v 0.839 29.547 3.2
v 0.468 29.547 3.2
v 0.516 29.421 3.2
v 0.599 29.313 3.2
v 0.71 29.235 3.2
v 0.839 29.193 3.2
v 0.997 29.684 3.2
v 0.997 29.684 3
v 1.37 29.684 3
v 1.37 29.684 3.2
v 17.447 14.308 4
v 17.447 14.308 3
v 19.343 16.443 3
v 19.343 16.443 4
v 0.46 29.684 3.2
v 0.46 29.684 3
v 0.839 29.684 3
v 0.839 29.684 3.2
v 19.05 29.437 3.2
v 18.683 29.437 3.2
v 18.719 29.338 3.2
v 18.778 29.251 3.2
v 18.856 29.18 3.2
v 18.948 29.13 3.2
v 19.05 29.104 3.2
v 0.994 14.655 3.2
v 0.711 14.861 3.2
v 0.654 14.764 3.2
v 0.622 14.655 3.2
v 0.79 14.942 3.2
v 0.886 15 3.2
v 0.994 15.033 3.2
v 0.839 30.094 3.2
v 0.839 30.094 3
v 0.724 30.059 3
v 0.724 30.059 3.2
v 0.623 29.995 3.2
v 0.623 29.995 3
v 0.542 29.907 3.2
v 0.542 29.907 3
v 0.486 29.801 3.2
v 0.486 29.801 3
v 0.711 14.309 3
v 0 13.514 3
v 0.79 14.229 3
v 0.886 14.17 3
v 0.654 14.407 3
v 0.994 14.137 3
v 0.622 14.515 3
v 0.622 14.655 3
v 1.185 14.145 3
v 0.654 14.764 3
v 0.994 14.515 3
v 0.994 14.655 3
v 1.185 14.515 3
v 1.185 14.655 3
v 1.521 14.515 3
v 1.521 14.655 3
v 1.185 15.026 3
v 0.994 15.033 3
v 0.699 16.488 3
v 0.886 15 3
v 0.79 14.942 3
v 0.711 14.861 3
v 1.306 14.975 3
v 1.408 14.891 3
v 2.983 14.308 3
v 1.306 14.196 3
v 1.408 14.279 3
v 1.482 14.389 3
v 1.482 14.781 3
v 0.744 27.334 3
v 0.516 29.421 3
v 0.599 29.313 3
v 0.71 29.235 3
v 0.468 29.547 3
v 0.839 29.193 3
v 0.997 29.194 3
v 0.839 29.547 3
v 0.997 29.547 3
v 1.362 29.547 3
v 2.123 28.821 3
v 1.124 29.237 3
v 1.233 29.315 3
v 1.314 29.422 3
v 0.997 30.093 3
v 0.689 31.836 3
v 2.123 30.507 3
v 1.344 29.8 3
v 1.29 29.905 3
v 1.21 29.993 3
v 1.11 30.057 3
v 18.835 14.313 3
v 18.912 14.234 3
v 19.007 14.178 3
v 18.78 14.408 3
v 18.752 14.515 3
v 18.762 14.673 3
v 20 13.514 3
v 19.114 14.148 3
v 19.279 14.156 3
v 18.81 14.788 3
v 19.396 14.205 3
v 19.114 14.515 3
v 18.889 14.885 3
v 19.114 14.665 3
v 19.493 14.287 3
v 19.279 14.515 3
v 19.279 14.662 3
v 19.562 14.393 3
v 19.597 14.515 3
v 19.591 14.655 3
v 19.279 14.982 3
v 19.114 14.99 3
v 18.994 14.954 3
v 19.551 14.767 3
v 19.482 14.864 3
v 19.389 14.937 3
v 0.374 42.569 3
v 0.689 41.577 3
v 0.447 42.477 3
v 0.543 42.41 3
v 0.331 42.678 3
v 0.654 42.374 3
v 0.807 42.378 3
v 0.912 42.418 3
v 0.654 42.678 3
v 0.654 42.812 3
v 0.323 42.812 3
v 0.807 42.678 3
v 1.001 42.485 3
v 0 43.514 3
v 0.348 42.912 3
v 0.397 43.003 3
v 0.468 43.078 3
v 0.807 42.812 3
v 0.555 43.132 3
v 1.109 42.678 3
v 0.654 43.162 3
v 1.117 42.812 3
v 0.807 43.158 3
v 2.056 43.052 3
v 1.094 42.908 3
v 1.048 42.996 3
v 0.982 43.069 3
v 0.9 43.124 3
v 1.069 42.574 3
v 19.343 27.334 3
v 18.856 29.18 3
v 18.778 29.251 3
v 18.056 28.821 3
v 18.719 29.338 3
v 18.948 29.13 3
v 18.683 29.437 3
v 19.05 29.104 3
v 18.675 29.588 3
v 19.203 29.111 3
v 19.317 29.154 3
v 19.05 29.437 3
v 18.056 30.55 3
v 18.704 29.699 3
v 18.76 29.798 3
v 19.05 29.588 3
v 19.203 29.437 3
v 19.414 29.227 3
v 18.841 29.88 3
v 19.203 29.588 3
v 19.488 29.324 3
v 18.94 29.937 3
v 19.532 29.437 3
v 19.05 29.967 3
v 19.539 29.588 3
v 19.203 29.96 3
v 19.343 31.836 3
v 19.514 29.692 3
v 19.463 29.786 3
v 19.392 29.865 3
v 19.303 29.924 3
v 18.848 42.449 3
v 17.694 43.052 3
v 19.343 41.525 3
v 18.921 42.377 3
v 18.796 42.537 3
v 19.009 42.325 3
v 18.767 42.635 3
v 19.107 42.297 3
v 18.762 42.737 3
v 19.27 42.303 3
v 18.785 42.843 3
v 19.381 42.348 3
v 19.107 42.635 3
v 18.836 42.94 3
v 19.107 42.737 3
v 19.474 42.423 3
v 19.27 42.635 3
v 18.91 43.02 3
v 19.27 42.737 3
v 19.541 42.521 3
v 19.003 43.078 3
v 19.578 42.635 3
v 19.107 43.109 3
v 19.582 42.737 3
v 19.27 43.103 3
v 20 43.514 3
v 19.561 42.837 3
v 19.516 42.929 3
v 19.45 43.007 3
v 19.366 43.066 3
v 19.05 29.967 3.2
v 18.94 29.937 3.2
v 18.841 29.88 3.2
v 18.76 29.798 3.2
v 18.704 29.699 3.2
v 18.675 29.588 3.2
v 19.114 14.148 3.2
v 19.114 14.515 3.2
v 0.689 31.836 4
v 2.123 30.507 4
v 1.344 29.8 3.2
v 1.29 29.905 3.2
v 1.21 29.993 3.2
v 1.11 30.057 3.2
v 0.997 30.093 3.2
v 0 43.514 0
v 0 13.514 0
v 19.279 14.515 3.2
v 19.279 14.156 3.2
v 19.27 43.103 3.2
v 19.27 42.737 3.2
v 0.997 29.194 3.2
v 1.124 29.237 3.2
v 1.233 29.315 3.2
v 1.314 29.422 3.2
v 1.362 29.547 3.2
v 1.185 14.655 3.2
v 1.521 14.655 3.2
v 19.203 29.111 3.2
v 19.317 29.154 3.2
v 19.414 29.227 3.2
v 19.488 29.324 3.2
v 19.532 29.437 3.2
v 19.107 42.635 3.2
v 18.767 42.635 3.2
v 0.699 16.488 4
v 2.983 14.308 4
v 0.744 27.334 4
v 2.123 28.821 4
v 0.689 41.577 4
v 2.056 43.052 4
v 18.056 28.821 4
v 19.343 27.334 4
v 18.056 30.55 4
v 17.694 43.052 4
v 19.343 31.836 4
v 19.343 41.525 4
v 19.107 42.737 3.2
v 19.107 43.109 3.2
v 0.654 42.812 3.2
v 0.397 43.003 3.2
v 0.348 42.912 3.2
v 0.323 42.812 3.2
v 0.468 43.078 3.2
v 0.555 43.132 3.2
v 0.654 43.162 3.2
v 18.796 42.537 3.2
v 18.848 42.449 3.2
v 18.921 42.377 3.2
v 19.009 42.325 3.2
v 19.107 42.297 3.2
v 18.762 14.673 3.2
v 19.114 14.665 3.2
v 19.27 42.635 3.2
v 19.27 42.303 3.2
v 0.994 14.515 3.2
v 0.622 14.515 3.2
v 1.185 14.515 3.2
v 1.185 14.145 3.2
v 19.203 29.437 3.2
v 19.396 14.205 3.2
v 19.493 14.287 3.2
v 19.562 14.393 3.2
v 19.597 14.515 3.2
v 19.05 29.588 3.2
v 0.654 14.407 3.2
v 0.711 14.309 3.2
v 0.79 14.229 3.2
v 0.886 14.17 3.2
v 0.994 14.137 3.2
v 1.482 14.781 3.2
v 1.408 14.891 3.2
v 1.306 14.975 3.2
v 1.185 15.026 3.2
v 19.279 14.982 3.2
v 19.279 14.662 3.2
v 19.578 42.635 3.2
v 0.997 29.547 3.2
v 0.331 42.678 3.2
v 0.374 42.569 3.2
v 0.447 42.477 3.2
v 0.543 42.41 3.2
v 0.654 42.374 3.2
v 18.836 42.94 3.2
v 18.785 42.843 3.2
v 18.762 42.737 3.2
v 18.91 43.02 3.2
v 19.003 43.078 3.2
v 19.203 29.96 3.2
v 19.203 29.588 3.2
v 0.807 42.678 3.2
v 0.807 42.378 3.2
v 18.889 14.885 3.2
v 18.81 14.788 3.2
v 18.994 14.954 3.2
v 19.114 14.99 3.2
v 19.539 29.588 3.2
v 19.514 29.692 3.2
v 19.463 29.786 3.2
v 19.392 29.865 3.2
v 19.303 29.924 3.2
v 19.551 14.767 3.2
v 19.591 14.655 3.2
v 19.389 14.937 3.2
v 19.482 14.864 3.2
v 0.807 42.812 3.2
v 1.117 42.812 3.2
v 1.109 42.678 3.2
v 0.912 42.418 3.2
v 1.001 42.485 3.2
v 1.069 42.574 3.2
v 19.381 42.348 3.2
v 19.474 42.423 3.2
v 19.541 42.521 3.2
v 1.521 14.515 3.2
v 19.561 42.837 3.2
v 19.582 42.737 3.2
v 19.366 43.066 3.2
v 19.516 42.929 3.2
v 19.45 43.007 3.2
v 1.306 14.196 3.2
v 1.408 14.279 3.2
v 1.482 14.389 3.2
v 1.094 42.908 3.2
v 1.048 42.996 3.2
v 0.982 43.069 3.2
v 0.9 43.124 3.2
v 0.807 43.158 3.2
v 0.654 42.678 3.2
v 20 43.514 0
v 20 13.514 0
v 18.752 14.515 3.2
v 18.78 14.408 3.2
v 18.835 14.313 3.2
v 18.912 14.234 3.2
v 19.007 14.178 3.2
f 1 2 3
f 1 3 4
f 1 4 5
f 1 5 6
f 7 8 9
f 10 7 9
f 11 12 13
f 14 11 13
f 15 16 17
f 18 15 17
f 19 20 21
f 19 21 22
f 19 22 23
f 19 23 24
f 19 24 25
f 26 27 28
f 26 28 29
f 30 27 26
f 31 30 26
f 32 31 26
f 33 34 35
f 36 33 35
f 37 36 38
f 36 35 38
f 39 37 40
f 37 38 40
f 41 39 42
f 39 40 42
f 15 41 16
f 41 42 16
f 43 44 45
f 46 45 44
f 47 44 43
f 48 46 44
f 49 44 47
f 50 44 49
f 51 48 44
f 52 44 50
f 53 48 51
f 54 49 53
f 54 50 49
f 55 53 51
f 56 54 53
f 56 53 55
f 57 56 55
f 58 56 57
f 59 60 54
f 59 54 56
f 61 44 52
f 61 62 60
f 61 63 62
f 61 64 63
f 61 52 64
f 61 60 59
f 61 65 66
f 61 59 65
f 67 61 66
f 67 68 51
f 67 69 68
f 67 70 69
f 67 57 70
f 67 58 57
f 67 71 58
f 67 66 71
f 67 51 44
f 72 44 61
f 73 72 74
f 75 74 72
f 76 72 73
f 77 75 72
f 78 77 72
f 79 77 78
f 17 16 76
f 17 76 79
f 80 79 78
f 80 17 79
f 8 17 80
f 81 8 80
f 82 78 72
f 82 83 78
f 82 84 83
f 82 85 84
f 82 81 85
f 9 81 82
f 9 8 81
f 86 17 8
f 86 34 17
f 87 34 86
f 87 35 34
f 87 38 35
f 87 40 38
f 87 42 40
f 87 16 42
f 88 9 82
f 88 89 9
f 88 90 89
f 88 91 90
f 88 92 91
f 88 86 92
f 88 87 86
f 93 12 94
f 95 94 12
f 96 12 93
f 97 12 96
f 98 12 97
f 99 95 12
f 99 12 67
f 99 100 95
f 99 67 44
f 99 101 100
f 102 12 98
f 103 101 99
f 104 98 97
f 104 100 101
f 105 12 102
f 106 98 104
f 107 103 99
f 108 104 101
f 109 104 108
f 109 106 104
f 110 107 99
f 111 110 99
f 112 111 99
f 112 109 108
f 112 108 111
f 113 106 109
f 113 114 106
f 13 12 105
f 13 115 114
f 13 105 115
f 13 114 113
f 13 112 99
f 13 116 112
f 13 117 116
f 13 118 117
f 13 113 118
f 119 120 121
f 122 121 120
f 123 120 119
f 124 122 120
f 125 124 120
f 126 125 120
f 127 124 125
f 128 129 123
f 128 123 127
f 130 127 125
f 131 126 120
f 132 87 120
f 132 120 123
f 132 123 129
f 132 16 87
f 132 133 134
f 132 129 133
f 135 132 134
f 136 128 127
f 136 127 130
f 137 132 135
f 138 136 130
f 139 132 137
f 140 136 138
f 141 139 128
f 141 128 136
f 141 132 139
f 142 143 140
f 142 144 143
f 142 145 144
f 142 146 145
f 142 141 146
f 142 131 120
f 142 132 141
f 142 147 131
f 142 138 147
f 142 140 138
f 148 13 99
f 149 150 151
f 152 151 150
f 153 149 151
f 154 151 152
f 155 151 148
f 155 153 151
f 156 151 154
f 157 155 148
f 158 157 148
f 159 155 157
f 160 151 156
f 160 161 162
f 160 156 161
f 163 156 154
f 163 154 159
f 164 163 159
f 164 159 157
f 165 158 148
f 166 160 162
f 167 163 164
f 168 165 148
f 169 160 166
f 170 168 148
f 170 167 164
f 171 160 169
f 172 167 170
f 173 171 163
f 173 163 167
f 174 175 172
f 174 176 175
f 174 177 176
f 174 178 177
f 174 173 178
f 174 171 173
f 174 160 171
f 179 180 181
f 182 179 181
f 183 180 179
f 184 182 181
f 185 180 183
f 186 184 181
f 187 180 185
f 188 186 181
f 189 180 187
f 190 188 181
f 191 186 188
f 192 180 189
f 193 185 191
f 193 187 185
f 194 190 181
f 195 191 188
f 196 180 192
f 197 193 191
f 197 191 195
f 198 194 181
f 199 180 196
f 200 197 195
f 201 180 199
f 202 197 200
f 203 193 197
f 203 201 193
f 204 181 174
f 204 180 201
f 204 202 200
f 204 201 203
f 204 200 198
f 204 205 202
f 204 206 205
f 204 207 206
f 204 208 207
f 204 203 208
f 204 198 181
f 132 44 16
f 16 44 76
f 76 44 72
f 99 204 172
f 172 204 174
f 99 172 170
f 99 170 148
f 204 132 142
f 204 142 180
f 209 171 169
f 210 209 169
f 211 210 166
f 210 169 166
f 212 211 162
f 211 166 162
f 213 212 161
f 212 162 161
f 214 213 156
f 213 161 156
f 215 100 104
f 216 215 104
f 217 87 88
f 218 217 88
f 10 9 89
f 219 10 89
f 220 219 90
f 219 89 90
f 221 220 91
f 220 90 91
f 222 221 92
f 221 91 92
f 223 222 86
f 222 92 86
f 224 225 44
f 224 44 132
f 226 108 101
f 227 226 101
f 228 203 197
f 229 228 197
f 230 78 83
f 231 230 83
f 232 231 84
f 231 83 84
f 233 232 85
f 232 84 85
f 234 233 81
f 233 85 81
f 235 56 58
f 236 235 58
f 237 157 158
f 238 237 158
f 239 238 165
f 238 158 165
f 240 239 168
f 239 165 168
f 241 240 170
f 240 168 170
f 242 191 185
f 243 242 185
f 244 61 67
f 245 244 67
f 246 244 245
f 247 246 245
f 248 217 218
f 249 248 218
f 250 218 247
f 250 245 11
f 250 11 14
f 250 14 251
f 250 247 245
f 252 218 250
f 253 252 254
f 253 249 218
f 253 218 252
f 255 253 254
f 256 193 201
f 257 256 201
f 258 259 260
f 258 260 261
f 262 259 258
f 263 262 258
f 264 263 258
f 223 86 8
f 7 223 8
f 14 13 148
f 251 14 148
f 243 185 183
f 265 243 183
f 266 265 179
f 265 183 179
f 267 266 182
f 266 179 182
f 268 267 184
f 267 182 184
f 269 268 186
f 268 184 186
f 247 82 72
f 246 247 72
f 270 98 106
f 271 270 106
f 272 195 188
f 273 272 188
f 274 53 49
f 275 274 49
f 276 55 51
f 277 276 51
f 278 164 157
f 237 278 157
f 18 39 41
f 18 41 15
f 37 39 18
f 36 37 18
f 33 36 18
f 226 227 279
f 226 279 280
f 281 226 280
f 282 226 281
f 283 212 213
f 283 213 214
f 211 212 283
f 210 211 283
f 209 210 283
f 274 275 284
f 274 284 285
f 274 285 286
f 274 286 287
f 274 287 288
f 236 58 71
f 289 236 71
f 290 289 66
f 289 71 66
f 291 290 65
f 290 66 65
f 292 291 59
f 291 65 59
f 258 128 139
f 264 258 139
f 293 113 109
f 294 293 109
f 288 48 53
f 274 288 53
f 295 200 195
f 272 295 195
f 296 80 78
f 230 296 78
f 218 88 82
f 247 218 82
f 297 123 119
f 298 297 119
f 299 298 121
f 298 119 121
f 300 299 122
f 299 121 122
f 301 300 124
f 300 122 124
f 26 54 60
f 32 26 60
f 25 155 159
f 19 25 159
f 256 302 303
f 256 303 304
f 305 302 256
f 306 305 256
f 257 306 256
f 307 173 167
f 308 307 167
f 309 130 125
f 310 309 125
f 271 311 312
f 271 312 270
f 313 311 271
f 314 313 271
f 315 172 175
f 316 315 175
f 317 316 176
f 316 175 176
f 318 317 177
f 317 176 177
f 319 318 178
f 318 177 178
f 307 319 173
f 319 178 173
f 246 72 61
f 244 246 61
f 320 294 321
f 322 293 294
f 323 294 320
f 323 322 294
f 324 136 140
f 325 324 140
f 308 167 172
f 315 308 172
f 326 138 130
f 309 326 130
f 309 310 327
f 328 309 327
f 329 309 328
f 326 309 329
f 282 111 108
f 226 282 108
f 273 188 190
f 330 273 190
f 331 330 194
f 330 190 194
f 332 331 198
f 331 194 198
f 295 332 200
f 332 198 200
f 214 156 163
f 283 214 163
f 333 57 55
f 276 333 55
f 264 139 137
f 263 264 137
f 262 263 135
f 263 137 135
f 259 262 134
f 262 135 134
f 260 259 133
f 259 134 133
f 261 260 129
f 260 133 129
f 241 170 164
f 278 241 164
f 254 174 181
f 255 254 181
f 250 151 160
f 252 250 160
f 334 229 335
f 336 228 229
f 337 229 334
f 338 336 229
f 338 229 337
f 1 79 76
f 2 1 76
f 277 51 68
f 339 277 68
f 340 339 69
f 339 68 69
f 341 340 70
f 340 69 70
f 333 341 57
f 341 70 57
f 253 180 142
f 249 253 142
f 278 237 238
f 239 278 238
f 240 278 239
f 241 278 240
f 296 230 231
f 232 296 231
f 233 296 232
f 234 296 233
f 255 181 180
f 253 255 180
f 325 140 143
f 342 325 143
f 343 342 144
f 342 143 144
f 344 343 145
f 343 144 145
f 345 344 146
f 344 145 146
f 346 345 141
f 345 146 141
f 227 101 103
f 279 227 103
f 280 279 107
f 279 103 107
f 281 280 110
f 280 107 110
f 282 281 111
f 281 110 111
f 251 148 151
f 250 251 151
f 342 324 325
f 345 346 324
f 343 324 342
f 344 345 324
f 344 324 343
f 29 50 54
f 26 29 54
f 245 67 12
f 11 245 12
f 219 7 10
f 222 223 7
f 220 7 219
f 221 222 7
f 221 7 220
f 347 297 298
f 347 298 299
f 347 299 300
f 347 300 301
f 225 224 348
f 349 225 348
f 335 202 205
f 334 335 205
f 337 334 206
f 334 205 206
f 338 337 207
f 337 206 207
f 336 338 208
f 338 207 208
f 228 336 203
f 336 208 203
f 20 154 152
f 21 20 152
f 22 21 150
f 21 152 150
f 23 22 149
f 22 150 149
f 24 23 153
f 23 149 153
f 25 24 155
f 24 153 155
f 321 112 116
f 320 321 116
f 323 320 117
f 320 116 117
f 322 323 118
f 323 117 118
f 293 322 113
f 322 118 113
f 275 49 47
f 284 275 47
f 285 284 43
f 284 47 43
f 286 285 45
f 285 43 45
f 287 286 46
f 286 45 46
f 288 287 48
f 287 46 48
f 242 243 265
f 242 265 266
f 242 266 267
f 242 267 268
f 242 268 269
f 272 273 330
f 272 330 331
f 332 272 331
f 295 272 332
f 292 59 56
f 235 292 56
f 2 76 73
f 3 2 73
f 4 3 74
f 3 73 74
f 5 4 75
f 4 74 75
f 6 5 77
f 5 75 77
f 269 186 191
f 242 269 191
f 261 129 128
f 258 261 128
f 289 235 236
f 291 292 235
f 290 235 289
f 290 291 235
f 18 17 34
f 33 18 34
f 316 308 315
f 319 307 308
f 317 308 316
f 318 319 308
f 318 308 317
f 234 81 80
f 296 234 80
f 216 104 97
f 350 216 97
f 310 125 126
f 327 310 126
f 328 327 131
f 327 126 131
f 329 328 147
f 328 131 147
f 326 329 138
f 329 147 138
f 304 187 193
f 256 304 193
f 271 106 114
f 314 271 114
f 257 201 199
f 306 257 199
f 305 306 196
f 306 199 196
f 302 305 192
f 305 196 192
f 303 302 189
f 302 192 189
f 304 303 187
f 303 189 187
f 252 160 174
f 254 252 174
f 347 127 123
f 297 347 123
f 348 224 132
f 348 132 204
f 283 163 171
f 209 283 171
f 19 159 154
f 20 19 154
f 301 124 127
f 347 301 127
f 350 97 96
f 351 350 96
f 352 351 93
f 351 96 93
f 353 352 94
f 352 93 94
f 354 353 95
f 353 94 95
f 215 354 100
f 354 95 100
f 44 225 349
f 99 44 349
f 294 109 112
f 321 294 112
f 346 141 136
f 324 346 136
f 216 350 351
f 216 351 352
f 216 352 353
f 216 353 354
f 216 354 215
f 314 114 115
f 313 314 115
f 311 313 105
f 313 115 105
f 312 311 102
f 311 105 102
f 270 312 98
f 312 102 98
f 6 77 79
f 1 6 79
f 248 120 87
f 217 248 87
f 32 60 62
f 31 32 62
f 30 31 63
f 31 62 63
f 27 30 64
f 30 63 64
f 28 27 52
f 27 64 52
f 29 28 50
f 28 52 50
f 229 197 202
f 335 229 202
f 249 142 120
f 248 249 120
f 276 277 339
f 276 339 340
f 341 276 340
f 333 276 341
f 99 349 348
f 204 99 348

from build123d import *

# Parameters (mm, degrees)
F0_W     = 20
F0_H     = 30
F1_DEPTH = 3
F3_DEPTH = 1
F5_DEPTH = 0.2


with BuildPart() as f1:
    # F0 (on Top) → F1 (new body)
    with BuildSketch(Plane.XY):
        with Locations((10, 28.513513)):
            Rectangle(F0_W, F0_H)
    extrude(amount=F1_DEPTH)

    # F2 (on face) → F3 (join)
    with BuildSketch(Plane.XY.offset(3)):
        Polygon((19.342611, 41.524556), (17.694369, 43.052193), (2.056164, 43.052193), (0.689328, 41.577448), (0.689328, 31.836104), (2.122905, 30.507424), (2.122905, 28.821025), (0.744304, 27.333586), (0.698527, 16.487885), (2.982544, 14.308448), (17.446602, 14.308448), (19.342611, 16.442662), (19.342611, 27.333586), (18.056178, 28.821025), (18.056178, 30.54967), (19.342611, 31.836104), align=None)
    extrude(amount=F3_DEPTH)

    # F4 (on face) → F5 (join)
    with BuildSketch(Plane.XY.offset(3)):
        with BuildLine():
            Line((19.270148, 42.736807), (19.582438, 42.736807))
            ThreePointArc((19.582438, 42.736807), (19.485372, 42.970235), (19.270148, 43.102861))
            Line((19.270148, 43.102861), (19.270148, 42.736807))
        make_face()
        with BuildLine():
            Line((19.107276, 42.736807), (19.107276, 43.109485))
            ThreePointArc((19.107276, 43.109485), (18.870383, 42.982736), (18.762206, 42.736807))
            Line((18.762206, 42.736807), (19.107276, 42.736807))
        make_face()
        with BuildLine():
            Line((0.654074, 42.812039), (0.654074, 43.161998))
            ThreePointArc((0.654074, 43.161998), (0.429915, 43.042523), (0.323149, 42.812039))
            Line((0.323149, 42.812039), (0.654074, 42.812039))
        make_face()
        with BuildLine():
            Line((0.807343, 42.812039), (1.117002, 42.812039))
            ThreePointArc((1.117002, 42.812039), (1.017574, 43.03455), (0.807343, 43.157838))
            Line((0.807343, 43.157838), (0.807343, 42.812039))
        make_face()
        with BuildLine():
            ThreePointArc((0.807343, 42.378449), (1.001335, 42.484646), (1.109067, 42.67779))
            Line((1.109067, 42.67779), (0.807343, 42.67779))
            Line((0.807343, 42.67779), (0.807343, 42.378449))
        make_face()
        with BuildLine():
            ThreePointArc((0.331085, 42.67779), (0.446612, 42.47712), (0.654074, 42.374289))
            Line((0.654074, 42.374289), (0.654074, 42.67779))
            Line((0.654074, 42.67779), (0.331085, 42.67779))
        make_face()
        with BuildLine():
            ThreePointArc((18.766535, 42.634873), (18.882517, 42.411034), (19.107276, 42.296845))
            Line((19.107276, 42.296845), (19.107276, 42.634873))
            Line((19.107276, 42.634873), (18.766535, 42.634873))
        make_face()
        with BuildLine():
            ThreePointArc((19.270148, 42.303468), (19.473758, 42.423052), (19.578109, 42.634873))
            Line((19.578109, 42.634873), (19.270148, 42.634873))
            Line((19.270148, 42.634873), (19.270148, 42.303468))
        make_face()
        with BuildLine():
            Line((0.996978, 29.684267), (1.370052, 29.684267))
            ThreePointArc((1.370052, 29.684267), (1.252467, 29.951603), (0.996978, 30.093093))
            Line((0.996978, 30.093093), (0.996978, 29.684267))
        make_face()
        with BuildLine():
            Line((0.838792, 29.684267), (0.838792, 30.094109))
            ThreePointArc((0.838792, 30.094109), (0.579506, 29.953764), (0.459937, 29.684267))
            Line((0.459937, 29.684267), (0.838792, 29.684267))
        make_face()
        with BuildLine():
            ThreePointArc((0.468405, 29.547278), (0.599281, 29.31341), (0.838792, 29.193174))
            Line((0.838792, 29.193174), (0.838792, 29.547278))
            Line((0.838792, 29.547278), (0.468405, 29.547278))
        make_face()
        with BuildLine():
            ThreePointArc((0.996978, 29.19419), (1.232823, 29.315445), (1.361583, 29.547278))
            Line((1.361583, 29.547278), (0.996978, 29.547278))
            Line((0.996978, 29.547278), (0.996978, 29.19419))
        make_face()
        with BuildLine():
            Line((19.202649, 29.588132), (19.539459, 29.588132))
            ThreePointArc((19.539459, 29.588132), (19.430045, 29.827535), (19.202649, 29.960107))
            Line((19.202649, 29.960107), (19.202649, 29.588132))
        make_face()
        with BuildLine():
            Line((19.050451, 29.588132), (19.050451, 29.966929))
            ThreePointArc((19.050451, 29.966929), (18.79808, 29.84169), (18.67526, 29.588132))
            Line((18.67526, 29.588132), (19.050451, 29.588132))
        make_face()
        with BuildLine():
            ThreePointArc((18.683212, 29.437403), (18.814648, 29.21315), (19.050451, 29.103779))
            Line((19.050451, 29.103779), (19.050451, 29.437403))
            Line((19.050451, 29.437403), (18.683212, 29.437403))
        make_face()
        with BuildLine():
            ThreePointArc((19.202649, 29.1106), (19.414205, 29.226579), (19.531507, 29.437403))
            Line((19.531507, 29.437403), (19.202649, 29.437403))
            Line((19.202649, 29.437403), (19.202649, 29.1106))
        make_face()
        with BuildLine():
            Line((0.994411, 14.655351), (0.994411, 15.033354))
            ThreePointArc((0.994411, 15.033354), (0.747631, 14.904186), (0.622466, 14.655351))
            Line((0.622466, 14.655351), (0.994411, 14.655351))
        make_face()
        with BuildLine():
            Line((1.184542, 14.655351), (1.521054, 14.655351))
            ThreePointArc((1.521054, 14.655351), (1.408339, 14.891019), (1.184542, 15.025773))
            Line((1.184542, 15.025773), (1.184542, 14.655351))
        make_face()
        with BuildLine():
            ThreePointArc((1.184542, 14.14473), (1.408339, 14.279484), (1.521054, 14.515152))
            Line((1.521054, 14.515152), (1.184542, 14.515152))
            Line((1.184542, 14.515152), (1.184542, 14.14473))
        make_face()
        with BuildLine():
            ThreePointArc((0.622466, 14.515152), (0.747631, 14.266317), (0.994411, 14.137149))
            Line((0.994411, 14.137149), (0.994411, 14.515152))
            Line((0.994411, 14.515152), (0.622466, 14.515152))
        make_face()
        with BuildLine():
            Line((19.278564, 14.661851), (19.591466, 14.655351))
            ThreePointArc((19.591466, 14.655351), (19.48198, 14.86364), (19.278564, 14.981936))
            Line((19.278564, 14.981936), (19.278564, 14.661851))
        make_face()
        with BuildLine():
            Line((19.113579, 14.665279), (19.113579, 14.990424))
            ThreePointArc((19.113579, 14.990424), (18.889292, 14.885036), (18.761711, 14.672588))
            Line((18.761711, 14.672588), (19.113579, 14.665279))
        make_face()
        with BuildLine():
            ThreePointArc((18.752394, 14.515152), (18.871129, 14.270688), (19.113579, 14.147892))
            Line((19.113579, 14.147892), (19.113579, 14.515152))
            Line((19.113579, 14.515152), (18.752394, 14.515152))
        make_face()
        with BuildLine():
            ThreePointArc((19.278564, 14.15638), (19.493042, 14.286674), (19.596844, 14.515152))
            Line((19.596844, 14.515152), (19.278564, 14.515152))
            Line((19.278564, 14.515152), (19.278564, 14.15638))
        make_face()
    extrude(amount=F5_DEPTH)


solid = f1.part
